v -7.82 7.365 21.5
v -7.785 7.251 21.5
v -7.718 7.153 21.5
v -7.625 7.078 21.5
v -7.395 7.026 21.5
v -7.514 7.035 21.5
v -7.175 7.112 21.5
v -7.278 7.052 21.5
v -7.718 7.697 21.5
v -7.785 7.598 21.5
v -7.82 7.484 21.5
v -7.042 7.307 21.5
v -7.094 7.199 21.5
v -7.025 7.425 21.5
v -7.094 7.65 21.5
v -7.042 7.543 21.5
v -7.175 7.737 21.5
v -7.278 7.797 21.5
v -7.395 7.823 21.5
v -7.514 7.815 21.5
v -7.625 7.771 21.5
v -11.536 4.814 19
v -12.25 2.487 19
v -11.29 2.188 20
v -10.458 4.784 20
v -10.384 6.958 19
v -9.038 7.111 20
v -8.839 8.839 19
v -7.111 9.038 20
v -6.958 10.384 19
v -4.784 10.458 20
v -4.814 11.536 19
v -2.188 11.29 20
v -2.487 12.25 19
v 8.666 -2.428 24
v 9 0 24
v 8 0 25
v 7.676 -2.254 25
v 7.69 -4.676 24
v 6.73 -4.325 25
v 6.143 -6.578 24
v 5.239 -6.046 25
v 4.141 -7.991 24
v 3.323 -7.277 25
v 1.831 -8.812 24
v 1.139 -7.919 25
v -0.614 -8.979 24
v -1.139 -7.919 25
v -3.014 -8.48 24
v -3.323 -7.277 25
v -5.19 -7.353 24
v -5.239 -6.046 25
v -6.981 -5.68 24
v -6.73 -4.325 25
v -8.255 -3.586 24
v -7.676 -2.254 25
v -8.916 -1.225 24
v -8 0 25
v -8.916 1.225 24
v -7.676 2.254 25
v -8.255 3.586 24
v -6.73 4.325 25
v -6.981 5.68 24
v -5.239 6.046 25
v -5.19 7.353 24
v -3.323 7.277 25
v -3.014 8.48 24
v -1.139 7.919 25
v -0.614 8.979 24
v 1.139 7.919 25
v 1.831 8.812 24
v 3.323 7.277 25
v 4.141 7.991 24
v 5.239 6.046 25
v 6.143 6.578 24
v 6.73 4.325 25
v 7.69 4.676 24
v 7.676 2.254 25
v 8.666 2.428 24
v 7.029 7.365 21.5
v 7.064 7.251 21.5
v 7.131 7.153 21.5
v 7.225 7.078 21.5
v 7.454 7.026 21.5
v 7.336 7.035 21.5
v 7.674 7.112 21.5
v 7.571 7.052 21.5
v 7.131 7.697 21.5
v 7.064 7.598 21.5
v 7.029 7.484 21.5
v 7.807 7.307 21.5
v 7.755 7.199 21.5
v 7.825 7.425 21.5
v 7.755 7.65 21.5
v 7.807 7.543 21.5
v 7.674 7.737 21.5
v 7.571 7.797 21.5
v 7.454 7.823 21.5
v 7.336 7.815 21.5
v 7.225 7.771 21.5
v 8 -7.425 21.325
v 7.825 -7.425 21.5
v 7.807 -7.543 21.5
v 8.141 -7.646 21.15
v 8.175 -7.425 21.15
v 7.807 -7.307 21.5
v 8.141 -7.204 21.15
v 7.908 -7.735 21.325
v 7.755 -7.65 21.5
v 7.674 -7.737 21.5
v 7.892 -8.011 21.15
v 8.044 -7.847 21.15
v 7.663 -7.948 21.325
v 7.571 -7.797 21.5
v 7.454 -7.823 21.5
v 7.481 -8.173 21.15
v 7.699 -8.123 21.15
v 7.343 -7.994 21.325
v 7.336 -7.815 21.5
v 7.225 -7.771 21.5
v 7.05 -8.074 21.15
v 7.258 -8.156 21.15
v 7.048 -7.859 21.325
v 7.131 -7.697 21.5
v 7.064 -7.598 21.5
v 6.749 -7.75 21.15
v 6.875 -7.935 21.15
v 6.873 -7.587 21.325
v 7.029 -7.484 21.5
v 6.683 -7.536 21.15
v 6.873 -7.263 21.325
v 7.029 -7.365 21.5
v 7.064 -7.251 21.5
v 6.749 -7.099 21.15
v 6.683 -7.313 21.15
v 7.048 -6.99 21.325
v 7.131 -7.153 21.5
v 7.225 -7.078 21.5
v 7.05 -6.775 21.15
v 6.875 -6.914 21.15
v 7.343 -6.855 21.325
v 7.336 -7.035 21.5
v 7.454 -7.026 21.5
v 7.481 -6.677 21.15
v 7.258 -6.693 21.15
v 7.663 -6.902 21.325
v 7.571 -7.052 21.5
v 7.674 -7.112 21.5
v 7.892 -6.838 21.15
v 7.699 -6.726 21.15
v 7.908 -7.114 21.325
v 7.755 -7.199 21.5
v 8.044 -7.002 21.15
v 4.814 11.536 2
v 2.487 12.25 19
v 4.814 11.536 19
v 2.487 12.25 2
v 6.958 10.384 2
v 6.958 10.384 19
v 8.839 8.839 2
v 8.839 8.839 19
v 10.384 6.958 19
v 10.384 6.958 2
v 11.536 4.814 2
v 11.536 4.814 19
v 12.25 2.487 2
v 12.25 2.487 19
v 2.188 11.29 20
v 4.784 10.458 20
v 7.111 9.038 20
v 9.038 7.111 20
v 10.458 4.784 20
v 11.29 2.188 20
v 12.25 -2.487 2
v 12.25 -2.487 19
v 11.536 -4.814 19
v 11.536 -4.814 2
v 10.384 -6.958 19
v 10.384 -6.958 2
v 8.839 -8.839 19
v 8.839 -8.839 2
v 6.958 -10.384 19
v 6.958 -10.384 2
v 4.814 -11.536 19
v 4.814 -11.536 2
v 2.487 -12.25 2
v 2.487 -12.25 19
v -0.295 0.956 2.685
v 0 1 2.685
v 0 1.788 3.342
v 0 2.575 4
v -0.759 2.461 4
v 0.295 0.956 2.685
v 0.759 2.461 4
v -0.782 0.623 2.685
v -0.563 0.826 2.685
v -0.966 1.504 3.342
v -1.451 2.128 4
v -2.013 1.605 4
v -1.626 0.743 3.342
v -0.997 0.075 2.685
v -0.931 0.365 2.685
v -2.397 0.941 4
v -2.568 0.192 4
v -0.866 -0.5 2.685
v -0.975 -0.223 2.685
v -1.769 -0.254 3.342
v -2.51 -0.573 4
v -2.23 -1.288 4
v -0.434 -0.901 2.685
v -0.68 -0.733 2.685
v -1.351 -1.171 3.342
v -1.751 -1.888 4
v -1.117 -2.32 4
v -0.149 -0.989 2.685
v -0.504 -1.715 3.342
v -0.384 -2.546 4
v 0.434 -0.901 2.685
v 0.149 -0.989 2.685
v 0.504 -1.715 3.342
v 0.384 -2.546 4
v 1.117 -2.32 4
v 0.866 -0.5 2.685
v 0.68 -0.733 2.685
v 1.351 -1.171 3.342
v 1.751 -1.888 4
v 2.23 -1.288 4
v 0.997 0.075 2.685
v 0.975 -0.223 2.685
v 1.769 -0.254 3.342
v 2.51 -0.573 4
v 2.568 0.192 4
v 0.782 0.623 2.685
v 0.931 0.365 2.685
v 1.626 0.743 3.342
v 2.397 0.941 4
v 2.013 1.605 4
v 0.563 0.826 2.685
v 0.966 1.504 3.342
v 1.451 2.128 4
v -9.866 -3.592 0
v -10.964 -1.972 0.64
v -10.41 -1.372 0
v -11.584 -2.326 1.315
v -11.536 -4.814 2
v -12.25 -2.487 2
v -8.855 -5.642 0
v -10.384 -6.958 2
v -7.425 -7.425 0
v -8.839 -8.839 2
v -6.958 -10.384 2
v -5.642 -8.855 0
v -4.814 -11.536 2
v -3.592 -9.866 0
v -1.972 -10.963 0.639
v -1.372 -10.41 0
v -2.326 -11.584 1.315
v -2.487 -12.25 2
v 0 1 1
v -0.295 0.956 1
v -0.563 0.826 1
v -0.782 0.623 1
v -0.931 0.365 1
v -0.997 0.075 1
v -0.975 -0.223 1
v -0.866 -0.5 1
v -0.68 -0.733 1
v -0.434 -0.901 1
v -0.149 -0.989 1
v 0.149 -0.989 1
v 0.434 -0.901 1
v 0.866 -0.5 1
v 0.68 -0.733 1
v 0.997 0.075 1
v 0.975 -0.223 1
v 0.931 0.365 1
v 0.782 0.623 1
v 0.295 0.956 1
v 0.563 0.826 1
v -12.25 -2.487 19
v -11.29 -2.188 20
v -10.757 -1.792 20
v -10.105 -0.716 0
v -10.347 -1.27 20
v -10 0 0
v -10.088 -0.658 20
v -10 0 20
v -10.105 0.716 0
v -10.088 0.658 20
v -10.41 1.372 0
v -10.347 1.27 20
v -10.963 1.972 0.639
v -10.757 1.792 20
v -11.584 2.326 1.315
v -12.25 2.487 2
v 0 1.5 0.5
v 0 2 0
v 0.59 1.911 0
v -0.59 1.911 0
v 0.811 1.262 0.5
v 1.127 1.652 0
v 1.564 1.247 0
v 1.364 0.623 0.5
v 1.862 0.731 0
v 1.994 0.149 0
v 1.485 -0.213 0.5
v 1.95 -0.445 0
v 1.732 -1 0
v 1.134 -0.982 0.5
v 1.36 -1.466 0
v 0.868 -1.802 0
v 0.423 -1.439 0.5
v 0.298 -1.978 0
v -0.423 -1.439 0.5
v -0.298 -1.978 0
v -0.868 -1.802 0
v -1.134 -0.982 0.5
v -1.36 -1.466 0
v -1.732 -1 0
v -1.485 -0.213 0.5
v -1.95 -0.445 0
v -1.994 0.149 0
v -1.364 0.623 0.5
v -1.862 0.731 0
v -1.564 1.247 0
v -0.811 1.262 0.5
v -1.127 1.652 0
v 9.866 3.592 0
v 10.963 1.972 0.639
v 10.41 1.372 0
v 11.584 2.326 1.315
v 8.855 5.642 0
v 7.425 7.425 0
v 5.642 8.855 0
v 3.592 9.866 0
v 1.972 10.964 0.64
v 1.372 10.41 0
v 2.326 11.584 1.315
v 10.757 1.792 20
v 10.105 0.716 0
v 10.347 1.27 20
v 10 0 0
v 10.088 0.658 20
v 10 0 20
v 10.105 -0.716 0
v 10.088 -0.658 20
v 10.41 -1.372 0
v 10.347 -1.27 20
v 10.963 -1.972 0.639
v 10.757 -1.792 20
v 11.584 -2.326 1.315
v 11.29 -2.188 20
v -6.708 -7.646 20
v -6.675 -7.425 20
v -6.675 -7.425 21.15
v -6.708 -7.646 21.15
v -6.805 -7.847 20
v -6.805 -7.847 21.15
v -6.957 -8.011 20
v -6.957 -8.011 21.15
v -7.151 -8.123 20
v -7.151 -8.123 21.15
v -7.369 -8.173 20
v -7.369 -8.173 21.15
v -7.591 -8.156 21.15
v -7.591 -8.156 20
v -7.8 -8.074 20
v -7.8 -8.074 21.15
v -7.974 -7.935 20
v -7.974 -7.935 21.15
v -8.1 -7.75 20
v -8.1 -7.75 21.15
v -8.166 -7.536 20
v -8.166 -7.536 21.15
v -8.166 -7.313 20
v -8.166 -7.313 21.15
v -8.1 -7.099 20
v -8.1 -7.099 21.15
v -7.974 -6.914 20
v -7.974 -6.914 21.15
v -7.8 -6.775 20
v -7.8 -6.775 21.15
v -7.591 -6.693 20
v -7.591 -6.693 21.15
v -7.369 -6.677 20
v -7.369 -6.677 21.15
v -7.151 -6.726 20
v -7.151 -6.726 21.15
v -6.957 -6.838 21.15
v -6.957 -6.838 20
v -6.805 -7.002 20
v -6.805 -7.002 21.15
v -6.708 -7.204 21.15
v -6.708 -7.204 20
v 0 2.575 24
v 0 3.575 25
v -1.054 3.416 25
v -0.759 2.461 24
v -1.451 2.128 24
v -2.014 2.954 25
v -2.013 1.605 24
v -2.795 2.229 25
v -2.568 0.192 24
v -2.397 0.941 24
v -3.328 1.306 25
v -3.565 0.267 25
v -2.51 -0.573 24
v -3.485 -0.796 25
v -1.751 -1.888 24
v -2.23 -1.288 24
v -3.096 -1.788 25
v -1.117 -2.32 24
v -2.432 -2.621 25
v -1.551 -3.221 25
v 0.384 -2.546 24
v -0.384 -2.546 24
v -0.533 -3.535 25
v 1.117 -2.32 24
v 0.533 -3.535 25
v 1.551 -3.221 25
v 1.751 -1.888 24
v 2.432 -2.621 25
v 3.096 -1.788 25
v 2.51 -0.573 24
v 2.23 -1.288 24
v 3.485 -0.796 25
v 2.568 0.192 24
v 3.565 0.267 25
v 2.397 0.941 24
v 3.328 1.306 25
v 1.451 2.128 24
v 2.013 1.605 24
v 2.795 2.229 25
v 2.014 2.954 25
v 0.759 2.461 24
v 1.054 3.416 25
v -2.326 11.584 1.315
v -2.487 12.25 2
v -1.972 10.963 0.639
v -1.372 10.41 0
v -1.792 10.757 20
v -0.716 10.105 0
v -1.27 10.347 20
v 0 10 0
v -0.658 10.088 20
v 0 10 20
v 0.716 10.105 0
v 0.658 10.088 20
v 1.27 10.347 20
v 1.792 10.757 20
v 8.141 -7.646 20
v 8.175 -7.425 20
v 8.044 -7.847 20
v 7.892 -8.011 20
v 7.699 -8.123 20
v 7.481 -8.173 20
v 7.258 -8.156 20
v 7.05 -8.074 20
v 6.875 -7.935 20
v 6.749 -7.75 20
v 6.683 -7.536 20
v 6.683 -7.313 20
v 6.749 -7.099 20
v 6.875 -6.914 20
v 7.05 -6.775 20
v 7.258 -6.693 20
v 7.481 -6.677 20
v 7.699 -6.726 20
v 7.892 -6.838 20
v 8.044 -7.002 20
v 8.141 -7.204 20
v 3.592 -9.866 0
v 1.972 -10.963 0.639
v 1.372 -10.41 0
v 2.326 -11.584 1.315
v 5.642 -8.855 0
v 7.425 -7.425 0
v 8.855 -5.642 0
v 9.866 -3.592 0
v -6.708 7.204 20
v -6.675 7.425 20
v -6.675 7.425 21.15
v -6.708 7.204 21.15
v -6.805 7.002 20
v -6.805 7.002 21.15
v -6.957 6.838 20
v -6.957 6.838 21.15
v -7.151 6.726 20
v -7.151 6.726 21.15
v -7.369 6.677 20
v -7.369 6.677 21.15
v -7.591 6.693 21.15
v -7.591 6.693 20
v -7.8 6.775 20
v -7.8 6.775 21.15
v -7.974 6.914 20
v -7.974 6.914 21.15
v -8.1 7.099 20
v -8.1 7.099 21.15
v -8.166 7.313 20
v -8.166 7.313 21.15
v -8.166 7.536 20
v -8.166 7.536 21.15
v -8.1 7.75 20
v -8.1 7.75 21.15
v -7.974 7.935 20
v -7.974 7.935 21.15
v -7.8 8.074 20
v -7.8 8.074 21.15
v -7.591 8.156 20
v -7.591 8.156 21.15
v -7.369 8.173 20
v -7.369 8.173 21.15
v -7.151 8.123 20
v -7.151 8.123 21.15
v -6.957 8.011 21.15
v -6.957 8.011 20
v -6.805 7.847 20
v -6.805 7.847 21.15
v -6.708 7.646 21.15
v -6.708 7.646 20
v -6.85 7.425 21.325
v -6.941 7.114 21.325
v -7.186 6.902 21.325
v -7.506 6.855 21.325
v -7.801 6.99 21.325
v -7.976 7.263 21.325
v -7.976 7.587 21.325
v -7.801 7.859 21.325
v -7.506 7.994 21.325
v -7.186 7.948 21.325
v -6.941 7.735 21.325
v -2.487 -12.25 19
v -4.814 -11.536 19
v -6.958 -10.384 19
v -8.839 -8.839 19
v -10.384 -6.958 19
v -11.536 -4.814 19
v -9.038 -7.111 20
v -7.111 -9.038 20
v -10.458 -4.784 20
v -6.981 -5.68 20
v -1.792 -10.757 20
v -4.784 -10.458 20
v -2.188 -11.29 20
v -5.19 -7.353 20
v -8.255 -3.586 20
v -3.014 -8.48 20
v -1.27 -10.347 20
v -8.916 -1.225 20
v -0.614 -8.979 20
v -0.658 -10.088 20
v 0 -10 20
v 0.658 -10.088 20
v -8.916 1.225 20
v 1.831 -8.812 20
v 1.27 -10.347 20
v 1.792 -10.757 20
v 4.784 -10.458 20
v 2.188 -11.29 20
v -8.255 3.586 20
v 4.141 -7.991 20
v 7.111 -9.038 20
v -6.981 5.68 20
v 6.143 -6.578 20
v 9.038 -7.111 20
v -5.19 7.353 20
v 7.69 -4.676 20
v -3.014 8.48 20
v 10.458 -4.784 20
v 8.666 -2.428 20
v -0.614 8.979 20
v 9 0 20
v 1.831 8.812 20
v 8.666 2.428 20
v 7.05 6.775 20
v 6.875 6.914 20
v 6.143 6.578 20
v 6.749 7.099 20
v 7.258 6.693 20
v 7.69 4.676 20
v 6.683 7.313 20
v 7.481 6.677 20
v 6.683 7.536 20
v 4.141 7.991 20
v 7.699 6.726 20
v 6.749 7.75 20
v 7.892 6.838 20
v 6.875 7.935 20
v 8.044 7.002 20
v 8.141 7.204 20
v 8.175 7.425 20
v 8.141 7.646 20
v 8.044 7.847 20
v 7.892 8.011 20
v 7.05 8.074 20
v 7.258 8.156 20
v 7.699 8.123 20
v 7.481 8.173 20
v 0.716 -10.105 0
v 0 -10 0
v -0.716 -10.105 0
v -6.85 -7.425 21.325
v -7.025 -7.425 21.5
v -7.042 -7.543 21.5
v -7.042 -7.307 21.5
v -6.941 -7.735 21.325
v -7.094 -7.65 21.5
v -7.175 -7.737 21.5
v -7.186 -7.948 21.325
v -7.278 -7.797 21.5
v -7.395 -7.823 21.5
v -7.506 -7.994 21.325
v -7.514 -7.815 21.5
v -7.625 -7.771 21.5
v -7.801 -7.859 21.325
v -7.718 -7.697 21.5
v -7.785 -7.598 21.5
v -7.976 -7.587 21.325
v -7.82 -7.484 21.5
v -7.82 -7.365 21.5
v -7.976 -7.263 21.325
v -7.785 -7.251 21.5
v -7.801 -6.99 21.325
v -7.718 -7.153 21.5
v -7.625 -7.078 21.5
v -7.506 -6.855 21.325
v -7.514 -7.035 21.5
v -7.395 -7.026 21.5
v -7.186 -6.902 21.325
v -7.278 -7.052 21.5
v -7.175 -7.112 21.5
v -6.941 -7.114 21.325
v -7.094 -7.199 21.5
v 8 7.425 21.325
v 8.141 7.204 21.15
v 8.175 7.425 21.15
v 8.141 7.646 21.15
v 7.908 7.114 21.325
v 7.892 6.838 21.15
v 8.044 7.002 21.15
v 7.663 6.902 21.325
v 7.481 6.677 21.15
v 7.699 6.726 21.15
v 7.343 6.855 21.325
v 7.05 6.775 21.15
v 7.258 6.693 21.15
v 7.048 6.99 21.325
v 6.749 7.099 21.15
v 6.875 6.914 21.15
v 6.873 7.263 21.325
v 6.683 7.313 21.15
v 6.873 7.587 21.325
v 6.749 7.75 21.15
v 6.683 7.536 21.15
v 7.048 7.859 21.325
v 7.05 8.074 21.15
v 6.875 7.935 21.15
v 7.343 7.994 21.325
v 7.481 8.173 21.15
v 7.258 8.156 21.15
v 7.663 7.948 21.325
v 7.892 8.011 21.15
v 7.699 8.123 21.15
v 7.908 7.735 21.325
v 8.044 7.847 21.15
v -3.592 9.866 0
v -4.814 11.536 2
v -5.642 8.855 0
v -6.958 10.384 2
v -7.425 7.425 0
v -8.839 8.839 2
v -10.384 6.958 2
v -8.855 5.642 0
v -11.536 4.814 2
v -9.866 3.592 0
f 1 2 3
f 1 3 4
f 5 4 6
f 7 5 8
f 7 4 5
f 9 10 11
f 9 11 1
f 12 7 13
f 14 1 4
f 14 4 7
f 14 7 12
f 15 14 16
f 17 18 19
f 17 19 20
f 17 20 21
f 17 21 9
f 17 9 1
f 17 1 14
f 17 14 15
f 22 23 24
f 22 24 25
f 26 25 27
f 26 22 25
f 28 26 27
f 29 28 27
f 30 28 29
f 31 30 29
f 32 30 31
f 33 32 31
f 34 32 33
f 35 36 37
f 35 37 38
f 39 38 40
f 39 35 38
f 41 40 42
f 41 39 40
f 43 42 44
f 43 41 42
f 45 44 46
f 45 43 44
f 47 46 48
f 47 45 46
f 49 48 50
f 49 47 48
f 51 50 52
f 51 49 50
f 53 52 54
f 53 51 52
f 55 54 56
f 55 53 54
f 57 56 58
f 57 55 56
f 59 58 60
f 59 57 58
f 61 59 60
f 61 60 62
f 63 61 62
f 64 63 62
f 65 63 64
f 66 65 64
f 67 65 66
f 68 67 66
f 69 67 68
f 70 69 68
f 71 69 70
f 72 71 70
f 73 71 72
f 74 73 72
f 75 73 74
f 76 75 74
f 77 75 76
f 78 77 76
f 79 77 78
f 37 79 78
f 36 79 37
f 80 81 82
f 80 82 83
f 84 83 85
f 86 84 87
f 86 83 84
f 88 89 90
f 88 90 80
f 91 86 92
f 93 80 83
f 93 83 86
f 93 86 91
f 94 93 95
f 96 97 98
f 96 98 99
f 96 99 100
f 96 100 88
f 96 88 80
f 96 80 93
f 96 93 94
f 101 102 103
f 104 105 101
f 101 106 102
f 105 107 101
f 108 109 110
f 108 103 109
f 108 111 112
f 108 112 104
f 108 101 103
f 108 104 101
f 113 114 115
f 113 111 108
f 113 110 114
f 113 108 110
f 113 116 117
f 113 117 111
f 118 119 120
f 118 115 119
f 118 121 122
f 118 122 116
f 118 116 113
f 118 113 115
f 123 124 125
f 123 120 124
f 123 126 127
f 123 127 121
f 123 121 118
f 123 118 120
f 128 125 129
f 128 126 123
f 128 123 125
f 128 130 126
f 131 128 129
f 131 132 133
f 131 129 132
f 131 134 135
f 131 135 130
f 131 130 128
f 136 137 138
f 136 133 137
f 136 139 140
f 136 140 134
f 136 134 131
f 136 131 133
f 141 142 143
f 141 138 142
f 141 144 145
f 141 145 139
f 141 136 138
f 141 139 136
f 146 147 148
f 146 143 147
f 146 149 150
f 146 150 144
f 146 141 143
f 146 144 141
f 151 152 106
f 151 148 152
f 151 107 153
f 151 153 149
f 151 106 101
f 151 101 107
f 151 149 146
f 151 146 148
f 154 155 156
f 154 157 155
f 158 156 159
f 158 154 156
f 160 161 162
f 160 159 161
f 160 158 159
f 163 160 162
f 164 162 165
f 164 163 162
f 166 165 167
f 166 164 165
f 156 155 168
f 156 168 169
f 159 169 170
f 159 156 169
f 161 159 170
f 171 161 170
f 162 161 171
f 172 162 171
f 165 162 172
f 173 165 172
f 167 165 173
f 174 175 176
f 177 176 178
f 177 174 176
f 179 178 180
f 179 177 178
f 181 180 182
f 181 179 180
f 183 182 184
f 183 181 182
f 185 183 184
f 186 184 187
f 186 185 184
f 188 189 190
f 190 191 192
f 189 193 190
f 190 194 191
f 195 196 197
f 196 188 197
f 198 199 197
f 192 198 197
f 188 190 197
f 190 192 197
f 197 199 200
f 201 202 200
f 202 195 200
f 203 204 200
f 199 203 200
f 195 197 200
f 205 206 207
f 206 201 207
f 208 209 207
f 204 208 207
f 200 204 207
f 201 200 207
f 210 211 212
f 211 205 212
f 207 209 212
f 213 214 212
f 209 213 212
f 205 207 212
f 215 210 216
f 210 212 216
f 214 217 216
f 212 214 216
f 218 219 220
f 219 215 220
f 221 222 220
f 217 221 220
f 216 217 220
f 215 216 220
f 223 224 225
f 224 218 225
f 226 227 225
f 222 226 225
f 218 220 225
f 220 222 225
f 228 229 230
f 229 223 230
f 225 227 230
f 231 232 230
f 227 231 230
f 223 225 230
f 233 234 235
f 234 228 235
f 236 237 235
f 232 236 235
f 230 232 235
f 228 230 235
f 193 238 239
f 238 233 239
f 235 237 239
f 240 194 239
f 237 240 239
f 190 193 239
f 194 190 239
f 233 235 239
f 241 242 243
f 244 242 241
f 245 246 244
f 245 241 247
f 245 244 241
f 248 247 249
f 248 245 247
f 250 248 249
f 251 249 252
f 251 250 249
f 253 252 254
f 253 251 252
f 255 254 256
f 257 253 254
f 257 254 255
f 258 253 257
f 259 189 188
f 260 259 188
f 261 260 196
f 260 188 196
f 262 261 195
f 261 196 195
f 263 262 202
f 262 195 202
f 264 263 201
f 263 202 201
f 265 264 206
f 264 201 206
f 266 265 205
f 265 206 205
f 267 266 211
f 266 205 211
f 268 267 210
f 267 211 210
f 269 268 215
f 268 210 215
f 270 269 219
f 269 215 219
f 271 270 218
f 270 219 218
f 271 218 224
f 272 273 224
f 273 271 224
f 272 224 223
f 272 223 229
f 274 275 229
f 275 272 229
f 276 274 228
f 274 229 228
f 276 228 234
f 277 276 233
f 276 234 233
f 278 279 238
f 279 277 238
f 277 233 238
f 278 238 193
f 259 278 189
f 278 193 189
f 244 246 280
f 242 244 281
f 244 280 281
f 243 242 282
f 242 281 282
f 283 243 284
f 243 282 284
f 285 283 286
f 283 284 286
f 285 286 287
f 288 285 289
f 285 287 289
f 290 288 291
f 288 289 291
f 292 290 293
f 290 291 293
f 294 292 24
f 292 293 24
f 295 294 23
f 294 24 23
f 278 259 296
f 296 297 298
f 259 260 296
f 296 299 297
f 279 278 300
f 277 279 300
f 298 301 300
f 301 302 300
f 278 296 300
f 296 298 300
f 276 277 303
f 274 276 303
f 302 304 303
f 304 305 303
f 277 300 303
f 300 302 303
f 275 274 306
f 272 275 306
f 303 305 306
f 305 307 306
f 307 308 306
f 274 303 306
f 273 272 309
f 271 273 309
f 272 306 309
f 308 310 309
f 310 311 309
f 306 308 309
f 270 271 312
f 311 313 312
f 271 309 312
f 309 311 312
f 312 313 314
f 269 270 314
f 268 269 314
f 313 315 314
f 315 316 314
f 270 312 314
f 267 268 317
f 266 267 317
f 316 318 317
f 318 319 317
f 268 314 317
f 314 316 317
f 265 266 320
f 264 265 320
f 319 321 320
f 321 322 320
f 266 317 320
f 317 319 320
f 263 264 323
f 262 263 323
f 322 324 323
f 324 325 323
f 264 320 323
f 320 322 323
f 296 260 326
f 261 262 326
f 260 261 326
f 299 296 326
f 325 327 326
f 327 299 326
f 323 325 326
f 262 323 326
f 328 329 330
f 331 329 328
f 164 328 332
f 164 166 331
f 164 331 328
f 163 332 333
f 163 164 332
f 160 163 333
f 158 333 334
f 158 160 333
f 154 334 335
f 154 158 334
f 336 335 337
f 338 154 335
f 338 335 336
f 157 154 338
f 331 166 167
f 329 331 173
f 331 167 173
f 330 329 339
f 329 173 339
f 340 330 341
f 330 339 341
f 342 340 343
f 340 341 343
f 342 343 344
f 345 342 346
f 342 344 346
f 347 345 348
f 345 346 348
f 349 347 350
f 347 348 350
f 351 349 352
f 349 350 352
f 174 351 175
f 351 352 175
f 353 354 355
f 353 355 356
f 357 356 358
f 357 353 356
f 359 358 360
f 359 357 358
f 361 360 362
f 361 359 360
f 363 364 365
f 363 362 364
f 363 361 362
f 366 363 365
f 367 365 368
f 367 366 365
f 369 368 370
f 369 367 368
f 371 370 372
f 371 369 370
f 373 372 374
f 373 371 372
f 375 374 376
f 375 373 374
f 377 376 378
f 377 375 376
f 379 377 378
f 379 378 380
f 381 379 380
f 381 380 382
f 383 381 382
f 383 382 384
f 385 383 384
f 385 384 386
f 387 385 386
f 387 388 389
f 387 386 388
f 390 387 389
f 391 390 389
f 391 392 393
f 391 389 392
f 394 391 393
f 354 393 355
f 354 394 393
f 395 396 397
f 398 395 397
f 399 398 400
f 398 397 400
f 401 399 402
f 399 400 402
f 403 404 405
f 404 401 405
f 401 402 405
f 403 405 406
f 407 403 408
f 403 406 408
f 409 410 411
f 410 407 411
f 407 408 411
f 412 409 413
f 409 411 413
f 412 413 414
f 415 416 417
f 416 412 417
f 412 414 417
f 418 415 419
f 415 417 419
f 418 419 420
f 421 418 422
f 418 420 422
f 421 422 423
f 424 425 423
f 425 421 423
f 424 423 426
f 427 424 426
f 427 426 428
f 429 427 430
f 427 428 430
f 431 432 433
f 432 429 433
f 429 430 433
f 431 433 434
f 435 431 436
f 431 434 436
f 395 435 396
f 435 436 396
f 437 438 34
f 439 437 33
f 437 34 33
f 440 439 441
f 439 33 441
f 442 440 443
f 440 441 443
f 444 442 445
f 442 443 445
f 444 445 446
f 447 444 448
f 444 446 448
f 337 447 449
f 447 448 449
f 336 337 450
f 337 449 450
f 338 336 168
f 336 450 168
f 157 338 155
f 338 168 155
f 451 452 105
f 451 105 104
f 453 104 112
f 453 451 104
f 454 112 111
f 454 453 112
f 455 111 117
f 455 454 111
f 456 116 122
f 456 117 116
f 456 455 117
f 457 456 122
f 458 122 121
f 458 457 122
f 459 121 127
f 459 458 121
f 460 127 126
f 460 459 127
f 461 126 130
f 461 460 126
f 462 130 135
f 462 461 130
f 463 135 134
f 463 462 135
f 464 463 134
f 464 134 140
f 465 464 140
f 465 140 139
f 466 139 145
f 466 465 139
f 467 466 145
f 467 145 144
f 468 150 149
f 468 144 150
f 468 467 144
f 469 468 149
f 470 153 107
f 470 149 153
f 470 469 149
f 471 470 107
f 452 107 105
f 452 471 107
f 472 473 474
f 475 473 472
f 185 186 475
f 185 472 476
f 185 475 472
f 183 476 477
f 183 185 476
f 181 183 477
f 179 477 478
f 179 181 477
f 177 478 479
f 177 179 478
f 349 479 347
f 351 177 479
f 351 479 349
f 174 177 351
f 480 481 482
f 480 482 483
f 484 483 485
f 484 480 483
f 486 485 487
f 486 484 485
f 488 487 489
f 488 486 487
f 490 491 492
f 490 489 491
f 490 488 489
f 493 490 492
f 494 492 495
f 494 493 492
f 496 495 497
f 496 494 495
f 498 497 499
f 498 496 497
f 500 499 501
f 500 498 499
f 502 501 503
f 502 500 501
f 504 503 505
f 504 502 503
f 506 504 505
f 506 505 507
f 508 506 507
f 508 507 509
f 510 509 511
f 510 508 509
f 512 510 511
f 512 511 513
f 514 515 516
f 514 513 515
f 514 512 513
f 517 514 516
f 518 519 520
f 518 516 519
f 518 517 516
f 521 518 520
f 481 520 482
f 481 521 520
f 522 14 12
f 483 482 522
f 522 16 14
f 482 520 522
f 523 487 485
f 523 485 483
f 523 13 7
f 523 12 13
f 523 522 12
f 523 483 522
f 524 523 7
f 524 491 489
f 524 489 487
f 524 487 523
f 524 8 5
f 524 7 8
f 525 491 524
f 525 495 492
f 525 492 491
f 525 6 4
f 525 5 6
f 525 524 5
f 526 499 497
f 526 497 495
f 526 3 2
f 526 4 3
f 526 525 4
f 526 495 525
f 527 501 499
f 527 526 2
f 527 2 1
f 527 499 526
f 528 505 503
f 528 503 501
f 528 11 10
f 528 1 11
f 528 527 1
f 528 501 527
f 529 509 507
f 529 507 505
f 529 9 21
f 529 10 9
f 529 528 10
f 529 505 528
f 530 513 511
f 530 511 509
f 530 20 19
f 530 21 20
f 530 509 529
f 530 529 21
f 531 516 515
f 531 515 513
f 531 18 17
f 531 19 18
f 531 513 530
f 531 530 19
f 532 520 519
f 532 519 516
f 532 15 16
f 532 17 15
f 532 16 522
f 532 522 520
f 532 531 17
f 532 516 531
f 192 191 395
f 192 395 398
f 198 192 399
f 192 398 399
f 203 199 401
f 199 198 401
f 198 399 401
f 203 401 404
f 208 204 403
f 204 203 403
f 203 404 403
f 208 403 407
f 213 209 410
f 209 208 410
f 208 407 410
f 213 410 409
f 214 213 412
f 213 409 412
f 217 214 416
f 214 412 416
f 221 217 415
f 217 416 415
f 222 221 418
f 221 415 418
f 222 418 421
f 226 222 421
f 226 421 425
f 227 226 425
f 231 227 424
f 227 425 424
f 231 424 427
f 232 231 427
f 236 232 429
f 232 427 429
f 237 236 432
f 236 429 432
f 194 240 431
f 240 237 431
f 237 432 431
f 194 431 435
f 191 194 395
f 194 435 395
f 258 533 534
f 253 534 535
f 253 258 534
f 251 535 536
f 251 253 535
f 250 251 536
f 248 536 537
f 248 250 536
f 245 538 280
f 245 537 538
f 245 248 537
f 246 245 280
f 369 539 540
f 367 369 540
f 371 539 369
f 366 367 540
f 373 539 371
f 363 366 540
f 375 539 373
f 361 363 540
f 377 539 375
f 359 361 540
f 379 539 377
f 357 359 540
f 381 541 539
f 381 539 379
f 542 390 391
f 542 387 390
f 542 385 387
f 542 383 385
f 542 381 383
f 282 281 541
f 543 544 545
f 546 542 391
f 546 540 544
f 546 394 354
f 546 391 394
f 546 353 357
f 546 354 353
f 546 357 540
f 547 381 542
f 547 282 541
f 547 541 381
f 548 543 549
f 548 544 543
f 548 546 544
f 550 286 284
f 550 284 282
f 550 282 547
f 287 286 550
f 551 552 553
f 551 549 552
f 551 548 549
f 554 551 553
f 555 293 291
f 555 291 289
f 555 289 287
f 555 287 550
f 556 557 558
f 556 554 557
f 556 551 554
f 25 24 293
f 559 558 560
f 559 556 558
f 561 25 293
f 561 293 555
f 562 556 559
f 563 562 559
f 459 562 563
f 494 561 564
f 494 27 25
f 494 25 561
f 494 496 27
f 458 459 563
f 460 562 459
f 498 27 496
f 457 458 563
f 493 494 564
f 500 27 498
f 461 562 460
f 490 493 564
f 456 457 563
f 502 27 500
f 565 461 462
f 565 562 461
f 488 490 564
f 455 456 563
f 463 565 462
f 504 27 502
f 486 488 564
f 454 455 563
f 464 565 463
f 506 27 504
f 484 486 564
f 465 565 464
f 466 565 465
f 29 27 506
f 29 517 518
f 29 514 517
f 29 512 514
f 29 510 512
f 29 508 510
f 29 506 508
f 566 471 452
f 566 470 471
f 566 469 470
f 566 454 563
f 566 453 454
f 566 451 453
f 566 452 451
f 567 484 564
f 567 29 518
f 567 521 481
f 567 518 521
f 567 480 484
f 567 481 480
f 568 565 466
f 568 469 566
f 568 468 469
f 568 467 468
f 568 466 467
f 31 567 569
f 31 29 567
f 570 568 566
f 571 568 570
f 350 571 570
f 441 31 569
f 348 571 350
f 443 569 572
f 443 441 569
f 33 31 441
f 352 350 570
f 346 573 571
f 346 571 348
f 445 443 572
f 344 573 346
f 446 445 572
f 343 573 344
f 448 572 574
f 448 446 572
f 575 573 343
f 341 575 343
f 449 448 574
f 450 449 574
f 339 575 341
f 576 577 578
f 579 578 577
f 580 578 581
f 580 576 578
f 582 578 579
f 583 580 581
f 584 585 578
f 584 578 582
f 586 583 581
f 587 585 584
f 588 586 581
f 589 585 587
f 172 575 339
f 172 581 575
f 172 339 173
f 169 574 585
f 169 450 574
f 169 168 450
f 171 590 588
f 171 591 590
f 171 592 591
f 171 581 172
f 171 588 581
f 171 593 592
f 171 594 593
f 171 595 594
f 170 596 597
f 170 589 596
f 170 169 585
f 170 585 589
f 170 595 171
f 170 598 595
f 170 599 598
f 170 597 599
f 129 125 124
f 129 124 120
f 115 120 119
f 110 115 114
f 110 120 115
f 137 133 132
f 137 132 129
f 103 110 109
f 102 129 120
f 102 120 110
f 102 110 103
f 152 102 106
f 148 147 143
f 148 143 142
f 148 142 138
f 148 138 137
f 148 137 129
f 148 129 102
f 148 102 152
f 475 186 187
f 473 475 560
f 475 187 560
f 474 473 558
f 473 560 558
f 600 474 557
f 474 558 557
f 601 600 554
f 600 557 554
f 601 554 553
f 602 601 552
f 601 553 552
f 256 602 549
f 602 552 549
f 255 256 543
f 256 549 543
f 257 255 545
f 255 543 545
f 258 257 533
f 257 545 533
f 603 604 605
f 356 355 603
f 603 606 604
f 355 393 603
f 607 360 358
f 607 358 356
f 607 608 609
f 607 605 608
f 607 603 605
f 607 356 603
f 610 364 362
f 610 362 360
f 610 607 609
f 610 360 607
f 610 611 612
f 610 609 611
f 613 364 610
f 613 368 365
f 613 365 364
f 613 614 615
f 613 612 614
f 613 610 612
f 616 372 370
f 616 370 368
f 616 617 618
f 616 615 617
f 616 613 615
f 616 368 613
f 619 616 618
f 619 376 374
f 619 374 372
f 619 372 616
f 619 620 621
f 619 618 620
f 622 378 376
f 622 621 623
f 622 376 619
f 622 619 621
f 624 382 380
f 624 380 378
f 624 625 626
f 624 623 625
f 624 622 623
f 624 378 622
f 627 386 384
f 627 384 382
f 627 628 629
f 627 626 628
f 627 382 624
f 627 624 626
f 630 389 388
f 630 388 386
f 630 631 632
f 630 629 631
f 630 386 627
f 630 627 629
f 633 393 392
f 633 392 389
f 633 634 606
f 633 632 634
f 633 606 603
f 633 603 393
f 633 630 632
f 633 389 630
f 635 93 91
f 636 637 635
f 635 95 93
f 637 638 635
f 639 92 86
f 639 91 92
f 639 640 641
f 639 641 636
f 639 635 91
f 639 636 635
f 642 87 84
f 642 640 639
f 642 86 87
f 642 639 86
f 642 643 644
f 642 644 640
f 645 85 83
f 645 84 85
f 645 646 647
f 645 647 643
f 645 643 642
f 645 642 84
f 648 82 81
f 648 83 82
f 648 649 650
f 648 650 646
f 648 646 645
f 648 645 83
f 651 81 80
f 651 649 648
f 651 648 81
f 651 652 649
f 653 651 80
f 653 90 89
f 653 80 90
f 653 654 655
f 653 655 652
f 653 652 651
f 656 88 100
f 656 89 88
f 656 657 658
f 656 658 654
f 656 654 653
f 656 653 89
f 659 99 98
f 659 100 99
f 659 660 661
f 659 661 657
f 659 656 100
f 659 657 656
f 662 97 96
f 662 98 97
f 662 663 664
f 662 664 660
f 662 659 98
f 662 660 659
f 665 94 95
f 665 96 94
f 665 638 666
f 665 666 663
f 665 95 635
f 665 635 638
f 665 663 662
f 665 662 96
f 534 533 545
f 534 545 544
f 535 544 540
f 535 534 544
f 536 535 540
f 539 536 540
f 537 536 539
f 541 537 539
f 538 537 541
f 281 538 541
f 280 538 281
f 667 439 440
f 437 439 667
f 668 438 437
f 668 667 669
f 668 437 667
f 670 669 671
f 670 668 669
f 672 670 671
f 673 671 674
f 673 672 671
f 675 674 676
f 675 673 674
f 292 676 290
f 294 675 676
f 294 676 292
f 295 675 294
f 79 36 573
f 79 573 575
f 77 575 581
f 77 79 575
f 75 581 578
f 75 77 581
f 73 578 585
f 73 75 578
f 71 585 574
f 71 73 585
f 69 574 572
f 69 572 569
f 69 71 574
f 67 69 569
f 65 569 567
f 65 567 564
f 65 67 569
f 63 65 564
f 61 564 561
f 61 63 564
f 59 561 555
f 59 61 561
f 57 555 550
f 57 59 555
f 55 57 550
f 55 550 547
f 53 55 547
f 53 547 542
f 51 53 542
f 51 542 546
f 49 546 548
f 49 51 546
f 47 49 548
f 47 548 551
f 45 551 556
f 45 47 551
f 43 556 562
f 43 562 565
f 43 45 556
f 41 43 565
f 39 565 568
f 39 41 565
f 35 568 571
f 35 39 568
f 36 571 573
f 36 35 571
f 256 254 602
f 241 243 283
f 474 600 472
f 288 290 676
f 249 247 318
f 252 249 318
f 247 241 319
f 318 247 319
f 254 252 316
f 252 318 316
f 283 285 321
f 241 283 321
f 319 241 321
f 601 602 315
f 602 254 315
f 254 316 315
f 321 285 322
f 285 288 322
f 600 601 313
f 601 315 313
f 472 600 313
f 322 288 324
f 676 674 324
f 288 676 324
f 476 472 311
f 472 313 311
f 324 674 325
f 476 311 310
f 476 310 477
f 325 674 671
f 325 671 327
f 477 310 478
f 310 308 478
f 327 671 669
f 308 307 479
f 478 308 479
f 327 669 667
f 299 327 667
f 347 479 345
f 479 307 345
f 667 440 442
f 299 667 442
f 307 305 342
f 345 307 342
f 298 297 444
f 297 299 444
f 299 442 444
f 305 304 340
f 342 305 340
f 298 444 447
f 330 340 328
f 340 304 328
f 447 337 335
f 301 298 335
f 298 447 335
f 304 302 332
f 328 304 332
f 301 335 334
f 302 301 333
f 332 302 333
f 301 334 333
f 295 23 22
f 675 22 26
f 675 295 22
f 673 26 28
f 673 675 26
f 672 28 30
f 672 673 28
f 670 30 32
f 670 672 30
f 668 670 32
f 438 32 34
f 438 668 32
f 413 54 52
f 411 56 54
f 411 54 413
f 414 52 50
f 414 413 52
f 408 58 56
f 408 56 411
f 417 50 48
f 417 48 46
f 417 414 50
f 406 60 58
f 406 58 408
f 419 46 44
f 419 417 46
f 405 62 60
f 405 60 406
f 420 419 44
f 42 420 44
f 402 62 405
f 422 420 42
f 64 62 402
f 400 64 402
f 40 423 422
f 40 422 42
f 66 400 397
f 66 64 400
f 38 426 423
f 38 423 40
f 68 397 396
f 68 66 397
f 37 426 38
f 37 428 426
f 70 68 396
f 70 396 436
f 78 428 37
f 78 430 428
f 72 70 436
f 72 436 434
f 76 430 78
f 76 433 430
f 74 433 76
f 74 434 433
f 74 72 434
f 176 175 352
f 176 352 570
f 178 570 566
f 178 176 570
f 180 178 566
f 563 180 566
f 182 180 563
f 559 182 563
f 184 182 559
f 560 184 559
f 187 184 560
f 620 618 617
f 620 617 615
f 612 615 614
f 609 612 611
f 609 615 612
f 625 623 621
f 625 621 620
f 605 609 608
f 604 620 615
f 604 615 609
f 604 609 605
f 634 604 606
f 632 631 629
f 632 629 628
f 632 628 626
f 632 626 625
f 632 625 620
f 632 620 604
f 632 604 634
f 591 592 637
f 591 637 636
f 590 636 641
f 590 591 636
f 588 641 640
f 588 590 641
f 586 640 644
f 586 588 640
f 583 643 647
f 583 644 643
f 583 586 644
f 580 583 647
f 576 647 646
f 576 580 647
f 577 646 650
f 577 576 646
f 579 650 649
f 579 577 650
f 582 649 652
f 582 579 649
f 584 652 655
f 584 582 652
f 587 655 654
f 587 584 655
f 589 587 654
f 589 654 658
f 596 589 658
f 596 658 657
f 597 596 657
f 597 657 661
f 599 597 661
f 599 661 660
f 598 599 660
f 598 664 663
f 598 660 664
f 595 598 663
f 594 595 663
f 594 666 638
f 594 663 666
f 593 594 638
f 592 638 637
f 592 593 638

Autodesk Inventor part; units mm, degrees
ref_plane "YZ Plane" through (0, 0, 0) normal (1, 0, 0) x (0, 1, 0)
ref_plane "XZ Plane" through (0, 0, 0) normal (0, 1, 0) x (-1, 0, 0)
ref_plane "XY Plane" through (0, 0, 0) normal (0, 0, 1) x (1, 0, 0)
sketch "Sketch1" plane through (0, 0, 0) normal (0, 0, 1) x (1, 0, 0)
  circle A0 centre (0, 0) radius 12.5
  dimension "d0" = 25
extrude "Extrusion1" add sketch "Sketch1" along normal blind 25
chamfer "Chamfer2" distance 2 angle 45 1 edges at (-12.5, 0, 0)
sketch "Sketch2" plane through (0, 0, 0) normal (1, 0, 0) x (0, 1, 0)
  line L0 (0, 0) -> (1, 0)
  line L1 (1, 0) -> (1, 4)
  line L2 (1, 4) -> (0, 4)
  line L3 (0, 4) -> (0, 0)
  line L4 (12.5, 25) -> (-12.5, 25) projected
  line L5 (0, 4) -> (2.575, 4)
  line L6 (2.575, 4) -> (2.575, 25)
  line L7 (2.575, 25) -> (0, 25)
  line L8 (0, 25) -> (0, 4)
  line L9 (2.575, 4) -> (1, 2.685)
  line L10 (1, 2.685) -> (0, 1.85) construction
  dimension "d9" = 1
  dimension "d10" = 2.575
  dimension "d11" = 4
  dimension "d42" = 2.15
revolve "Revolution1" cut sketch "Sketch2" angle 360 about axis through (0, 0, 25) along (0, 0, -1)
chamfer "Chamfer3" distance 1 angle 45 2 edges at (0, -1, 0) (0, -2.575, 25)
sketch "Sketch3" plane through (0, 0, 25) normal (0, 0, 1) x (1, 0, 0)
  circle A0 centre (0, 0) radius 9
  line L0 (0, 0) -> (26.029, 0) construction
  circle A1 centre (0, 0) radius 12.5 construction
  circle A2 centre (12.5, 0) radius 2.5
  circle A3 centre (0, 12.5) radius 2.5
  circle A4 centre (-12.5, 0) radius 2.5
  circle A5 centre (0, -12.5) radius 2.5
  circle A6 centre (0, 0) radius 12.5
  point P0 (-2.4875, 12.25)
  point P1 (-12.25, 2.4875)
  point P2 (-12.25, -2.4875)
  point P3 (-2.4875, -12.25)
  point P4 (2.4875, -12.25)
  point P5 (12.25, -2.4875)
  point P6 (12.25, 2.4875)
  point P7 (2.4875, 12.25)
  dimension "d16" = 5
  dimension "d19" = 360
  dimension "d21" = 25
  dimension "d22" = 18
extrude "Extrusion2" cut sketch "Sketch3" against normal through all contours A2 A6 | A6 A2 | A6 A3 | A3 A6 | A6 A5 | A5 A6 | A6 A4 | A4 A6
extrude "Extrusion3" cut sketch "Sketch3" against normal blind 5 contours A2 A6 A5 A4 A3
chamfer "Chamfer4" distance 1 angle 45 5 edges at (-9, 0, 25) (-8.8388, -8.8388, 20) (8.8388, -8.8388, 20) (8.8388, 8.8388, 20) (-8.8388, 8.8388, 20)
sketch "Sketch4" plane through (0, 0, 20) normal (0, 0, 1) x (1, 0, 0)
  line L0 (0, 0) -> (-18.6595, 0) construction
  line L1 (0, 0) -> (0, 25.4609) construction
  circle A0 centre (0, 0) radius 2.575 construction
  line L2 (0, 0) -> (-16.5294, 16.5294) construction
  circle A1 centre (-7.4246, 7.4246) radius 0.75
  circle A2 centre (0, 0) radius 3.575 construction
  circle A3 centre (0, 0) radius 10.5 construction
  circle A4 centre (-7.4246, -7.4246) radius 0.75
  circle A5 centre (7.4246, -7.4246) radius 0.75
  circle A6 centre (7.4246, 7.4246) radius 0.75
  point P0 (0, 0)
  dimension "d31" = 21
  dimension "d30" = 45
  dimension "d32" = 1.5
  dimension "d35" = 360
extrude "Extrusion4" add sketch "Sketch4" along normal blind 1.5
chamfer "Chamfer5" distance 0.35 angle 45 4 edges at (6.6746, 7.4246, 21.5) (-8.1746, 7.4246, 21.5) (-8.1746, -7.4246, 21.5) (6.6746, -7.4246, 21.5)
properties part number "centrifugetool_5mm_base_v2"
